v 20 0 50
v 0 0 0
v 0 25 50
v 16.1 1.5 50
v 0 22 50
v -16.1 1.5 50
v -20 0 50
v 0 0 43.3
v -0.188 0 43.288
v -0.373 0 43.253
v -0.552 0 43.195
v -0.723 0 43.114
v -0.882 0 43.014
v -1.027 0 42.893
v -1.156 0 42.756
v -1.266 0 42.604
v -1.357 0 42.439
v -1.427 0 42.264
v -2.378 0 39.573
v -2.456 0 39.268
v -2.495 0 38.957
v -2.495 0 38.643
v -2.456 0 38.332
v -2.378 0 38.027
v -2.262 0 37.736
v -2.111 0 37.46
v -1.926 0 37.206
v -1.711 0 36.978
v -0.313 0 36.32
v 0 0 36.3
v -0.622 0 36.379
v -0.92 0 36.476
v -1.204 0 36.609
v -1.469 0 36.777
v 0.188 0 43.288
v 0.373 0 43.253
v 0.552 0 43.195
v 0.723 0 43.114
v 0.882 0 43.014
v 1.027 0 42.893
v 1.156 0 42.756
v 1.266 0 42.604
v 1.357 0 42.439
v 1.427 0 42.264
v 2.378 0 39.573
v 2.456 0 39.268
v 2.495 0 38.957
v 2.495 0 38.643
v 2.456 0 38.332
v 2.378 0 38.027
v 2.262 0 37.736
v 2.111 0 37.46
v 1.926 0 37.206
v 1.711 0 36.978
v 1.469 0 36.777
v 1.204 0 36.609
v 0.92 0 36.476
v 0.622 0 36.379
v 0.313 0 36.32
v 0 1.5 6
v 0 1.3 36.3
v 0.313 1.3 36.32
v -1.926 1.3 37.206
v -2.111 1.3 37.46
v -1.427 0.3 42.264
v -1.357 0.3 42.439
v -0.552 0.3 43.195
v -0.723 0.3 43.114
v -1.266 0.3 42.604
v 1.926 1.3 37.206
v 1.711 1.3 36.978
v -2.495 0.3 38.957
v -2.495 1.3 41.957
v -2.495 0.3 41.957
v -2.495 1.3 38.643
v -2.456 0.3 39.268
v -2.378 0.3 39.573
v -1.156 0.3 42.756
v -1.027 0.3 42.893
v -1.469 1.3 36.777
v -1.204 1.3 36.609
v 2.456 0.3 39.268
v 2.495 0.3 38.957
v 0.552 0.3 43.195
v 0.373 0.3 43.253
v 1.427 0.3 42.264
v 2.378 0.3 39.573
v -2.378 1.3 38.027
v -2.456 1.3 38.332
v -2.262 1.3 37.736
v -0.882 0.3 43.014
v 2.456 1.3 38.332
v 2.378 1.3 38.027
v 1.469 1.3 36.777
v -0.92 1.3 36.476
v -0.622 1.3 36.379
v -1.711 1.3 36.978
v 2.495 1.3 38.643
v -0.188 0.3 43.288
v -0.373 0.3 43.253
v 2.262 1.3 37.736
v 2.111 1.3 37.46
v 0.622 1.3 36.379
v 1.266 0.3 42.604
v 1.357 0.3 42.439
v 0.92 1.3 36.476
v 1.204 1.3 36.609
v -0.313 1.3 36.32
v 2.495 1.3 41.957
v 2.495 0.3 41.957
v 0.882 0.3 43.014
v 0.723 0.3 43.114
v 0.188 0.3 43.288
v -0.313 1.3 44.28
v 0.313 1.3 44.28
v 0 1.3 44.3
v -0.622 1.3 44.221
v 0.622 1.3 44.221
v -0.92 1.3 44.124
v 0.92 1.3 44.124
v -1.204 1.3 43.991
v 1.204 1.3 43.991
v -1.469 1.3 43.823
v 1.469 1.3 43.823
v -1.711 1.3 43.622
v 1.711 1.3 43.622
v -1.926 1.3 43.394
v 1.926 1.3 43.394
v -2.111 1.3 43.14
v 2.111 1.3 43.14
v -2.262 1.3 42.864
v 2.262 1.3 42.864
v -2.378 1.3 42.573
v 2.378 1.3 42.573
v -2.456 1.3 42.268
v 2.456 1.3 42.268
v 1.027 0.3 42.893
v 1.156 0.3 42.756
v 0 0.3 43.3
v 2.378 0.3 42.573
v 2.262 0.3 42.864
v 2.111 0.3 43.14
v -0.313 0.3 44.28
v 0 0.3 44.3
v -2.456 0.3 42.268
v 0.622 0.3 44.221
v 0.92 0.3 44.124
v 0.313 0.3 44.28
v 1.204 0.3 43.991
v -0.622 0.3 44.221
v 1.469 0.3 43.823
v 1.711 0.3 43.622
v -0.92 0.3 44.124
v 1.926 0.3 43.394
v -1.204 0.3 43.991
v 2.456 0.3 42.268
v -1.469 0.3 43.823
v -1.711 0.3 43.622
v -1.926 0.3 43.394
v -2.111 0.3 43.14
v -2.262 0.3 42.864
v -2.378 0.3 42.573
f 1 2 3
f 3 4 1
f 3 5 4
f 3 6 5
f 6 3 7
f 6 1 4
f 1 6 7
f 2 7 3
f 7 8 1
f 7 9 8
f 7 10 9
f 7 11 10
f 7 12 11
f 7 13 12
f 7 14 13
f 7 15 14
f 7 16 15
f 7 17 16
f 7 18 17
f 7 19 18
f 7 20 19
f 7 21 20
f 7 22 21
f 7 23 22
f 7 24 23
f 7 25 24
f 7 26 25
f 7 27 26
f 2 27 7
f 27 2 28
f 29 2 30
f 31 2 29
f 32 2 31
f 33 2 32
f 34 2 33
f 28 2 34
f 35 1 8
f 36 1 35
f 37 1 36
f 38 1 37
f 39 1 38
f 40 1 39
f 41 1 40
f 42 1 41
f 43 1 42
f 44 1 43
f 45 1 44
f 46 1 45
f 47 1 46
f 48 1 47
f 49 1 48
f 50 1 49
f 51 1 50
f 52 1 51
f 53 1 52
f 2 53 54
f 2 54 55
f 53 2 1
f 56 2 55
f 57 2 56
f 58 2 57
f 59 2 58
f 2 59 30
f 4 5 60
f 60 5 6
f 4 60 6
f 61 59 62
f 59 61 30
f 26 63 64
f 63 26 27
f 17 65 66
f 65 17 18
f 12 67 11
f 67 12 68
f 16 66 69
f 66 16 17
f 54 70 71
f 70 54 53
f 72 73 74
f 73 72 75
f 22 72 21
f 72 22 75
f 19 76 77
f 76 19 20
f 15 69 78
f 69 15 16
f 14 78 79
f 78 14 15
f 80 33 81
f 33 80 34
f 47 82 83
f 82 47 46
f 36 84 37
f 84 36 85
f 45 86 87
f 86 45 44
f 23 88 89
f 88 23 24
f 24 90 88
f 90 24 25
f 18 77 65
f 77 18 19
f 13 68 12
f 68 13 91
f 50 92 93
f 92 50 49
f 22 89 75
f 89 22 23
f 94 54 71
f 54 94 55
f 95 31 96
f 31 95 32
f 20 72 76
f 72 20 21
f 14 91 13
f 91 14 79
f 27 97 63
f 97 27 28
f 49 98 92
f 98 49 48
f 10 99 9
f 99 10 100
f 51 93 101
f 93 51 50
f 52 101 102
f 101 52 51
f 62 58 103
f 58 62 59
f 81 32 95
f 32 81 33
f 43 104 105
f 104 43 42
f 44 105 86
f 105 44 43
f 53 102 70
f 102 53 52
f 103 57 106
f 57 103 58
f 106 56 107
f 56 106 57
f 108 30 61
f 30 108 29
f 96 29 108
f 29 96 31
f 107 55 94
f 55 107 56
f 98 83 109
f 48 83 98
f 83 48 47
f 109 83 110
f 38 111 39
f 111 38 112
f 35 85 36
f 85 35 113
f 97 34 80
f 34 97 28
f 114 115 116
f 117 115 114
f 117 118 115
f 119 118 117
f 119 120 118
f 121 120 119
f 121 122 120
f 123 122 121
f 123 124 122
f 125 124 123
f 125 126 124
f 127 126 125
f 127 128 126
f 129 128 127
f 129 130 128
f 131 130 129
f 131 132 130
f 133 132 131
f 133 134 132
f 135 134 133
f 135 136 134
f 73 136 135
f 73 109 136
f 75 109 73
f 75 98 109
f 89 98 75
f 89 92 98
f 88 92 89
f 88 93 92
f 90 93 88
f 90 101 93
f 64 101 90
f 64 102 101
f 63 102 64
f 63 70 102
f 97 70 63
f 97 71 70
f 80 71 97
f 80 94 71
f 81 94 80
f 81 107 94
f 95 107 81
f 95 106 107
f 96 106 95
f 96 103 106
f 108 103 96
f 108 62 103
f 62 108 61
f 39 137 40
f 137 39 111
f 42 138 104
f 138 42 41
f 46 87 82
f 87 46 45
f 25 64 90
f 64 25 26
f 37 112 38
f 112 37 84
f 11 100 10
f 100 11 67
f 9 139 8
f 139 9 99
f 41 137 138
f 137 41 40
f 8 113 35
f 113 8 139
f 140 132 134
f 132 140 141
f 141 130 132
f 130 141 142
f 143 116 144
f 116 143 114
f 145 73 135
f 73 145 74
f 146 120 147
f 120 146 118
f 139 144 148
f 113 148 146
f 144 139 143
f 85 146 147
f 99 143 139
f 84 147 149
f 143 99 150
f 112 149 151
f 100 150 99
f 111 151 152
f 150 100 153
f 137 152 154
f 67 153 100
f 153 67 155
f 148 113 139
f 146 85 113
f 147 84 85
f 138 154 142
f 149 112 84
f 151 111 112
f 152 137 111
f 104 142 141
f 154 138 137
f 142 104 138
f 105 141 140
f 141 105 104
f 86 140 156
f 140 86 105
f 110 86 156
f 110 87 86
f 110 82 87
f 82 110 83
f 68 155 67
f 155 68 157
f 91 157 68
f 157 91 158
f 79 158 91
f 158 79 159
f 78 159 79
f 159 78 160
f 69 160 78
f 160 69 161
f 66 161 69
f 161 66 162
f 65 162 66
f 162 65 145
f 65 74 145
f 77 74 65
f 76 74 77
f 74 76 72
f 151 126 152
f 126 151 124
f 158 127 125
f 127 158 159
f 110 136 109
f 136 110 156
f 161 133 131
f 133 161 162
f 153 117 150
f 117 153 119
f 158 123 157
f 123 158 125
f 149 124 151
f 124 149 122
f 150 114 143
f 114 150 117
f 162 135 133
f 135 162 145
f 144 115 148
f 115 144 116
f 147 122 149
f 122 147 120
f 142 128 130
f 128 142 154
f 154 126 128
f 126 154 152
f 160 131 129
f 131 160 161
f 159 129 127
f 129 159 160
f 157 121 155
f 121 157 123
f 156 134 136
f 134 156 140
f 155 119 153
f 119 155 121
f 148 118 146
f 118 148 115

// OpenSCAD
$fn = 50;

module poly(x1, x2, x3, y1, y2, z1, z2) {
    polyhedron(
        points=[
            [x1, y1, z1],  // 0
            [x2, y1, z2],  // 1
            [x3, y1, z2],  // 2
            [x1, y2, z2]], // 3
        faces=[[0, 3, 1],
               [1, 3, 2],
               [0, 2, 3],
               [1, 2, 3],
               [0, 1, 2]]);
}

module nailmount(d) {
    ot = d - .3;
    it = d - ot;
    rotate([90, 270, 0]) {
        // Outside (uneven circles)
       hull() {
            translate([d, 0, 0]) cylinder(h=d, r=2.5);
            translate([3 + d, 0, 0]) cylinder(h=d, r=1.5);
        }
        // Inside bits (even circles)
        hull() {
            translate([d, 0, 0]) cylinder(h=ot, r=2.5);
            translate([3 + d, 0]) cylinder(h=ot, r=2.5);
        }
    }
}

module vase(w, h, d, t) {
    ih = (d - (2*t)) / (d/h);
    iw = (d - (2*t)) / (d / (w/2));
    difference() {
        poly(0, w/2, -w/2, 0, d, 0, h);
        poly(0, iw-t, -iw+t, t, d-(2*t), h-ih, h);
    }
}

module vase_with_nailmount(w, h, d, t) {
    difference() {
        vase(w, h, d, t);
        translate([0, t-.20001, h*.75]) nailmount(t-.2);
    }
}

vase_with_nailmount(40, h=50, d=25, t=1.5);
